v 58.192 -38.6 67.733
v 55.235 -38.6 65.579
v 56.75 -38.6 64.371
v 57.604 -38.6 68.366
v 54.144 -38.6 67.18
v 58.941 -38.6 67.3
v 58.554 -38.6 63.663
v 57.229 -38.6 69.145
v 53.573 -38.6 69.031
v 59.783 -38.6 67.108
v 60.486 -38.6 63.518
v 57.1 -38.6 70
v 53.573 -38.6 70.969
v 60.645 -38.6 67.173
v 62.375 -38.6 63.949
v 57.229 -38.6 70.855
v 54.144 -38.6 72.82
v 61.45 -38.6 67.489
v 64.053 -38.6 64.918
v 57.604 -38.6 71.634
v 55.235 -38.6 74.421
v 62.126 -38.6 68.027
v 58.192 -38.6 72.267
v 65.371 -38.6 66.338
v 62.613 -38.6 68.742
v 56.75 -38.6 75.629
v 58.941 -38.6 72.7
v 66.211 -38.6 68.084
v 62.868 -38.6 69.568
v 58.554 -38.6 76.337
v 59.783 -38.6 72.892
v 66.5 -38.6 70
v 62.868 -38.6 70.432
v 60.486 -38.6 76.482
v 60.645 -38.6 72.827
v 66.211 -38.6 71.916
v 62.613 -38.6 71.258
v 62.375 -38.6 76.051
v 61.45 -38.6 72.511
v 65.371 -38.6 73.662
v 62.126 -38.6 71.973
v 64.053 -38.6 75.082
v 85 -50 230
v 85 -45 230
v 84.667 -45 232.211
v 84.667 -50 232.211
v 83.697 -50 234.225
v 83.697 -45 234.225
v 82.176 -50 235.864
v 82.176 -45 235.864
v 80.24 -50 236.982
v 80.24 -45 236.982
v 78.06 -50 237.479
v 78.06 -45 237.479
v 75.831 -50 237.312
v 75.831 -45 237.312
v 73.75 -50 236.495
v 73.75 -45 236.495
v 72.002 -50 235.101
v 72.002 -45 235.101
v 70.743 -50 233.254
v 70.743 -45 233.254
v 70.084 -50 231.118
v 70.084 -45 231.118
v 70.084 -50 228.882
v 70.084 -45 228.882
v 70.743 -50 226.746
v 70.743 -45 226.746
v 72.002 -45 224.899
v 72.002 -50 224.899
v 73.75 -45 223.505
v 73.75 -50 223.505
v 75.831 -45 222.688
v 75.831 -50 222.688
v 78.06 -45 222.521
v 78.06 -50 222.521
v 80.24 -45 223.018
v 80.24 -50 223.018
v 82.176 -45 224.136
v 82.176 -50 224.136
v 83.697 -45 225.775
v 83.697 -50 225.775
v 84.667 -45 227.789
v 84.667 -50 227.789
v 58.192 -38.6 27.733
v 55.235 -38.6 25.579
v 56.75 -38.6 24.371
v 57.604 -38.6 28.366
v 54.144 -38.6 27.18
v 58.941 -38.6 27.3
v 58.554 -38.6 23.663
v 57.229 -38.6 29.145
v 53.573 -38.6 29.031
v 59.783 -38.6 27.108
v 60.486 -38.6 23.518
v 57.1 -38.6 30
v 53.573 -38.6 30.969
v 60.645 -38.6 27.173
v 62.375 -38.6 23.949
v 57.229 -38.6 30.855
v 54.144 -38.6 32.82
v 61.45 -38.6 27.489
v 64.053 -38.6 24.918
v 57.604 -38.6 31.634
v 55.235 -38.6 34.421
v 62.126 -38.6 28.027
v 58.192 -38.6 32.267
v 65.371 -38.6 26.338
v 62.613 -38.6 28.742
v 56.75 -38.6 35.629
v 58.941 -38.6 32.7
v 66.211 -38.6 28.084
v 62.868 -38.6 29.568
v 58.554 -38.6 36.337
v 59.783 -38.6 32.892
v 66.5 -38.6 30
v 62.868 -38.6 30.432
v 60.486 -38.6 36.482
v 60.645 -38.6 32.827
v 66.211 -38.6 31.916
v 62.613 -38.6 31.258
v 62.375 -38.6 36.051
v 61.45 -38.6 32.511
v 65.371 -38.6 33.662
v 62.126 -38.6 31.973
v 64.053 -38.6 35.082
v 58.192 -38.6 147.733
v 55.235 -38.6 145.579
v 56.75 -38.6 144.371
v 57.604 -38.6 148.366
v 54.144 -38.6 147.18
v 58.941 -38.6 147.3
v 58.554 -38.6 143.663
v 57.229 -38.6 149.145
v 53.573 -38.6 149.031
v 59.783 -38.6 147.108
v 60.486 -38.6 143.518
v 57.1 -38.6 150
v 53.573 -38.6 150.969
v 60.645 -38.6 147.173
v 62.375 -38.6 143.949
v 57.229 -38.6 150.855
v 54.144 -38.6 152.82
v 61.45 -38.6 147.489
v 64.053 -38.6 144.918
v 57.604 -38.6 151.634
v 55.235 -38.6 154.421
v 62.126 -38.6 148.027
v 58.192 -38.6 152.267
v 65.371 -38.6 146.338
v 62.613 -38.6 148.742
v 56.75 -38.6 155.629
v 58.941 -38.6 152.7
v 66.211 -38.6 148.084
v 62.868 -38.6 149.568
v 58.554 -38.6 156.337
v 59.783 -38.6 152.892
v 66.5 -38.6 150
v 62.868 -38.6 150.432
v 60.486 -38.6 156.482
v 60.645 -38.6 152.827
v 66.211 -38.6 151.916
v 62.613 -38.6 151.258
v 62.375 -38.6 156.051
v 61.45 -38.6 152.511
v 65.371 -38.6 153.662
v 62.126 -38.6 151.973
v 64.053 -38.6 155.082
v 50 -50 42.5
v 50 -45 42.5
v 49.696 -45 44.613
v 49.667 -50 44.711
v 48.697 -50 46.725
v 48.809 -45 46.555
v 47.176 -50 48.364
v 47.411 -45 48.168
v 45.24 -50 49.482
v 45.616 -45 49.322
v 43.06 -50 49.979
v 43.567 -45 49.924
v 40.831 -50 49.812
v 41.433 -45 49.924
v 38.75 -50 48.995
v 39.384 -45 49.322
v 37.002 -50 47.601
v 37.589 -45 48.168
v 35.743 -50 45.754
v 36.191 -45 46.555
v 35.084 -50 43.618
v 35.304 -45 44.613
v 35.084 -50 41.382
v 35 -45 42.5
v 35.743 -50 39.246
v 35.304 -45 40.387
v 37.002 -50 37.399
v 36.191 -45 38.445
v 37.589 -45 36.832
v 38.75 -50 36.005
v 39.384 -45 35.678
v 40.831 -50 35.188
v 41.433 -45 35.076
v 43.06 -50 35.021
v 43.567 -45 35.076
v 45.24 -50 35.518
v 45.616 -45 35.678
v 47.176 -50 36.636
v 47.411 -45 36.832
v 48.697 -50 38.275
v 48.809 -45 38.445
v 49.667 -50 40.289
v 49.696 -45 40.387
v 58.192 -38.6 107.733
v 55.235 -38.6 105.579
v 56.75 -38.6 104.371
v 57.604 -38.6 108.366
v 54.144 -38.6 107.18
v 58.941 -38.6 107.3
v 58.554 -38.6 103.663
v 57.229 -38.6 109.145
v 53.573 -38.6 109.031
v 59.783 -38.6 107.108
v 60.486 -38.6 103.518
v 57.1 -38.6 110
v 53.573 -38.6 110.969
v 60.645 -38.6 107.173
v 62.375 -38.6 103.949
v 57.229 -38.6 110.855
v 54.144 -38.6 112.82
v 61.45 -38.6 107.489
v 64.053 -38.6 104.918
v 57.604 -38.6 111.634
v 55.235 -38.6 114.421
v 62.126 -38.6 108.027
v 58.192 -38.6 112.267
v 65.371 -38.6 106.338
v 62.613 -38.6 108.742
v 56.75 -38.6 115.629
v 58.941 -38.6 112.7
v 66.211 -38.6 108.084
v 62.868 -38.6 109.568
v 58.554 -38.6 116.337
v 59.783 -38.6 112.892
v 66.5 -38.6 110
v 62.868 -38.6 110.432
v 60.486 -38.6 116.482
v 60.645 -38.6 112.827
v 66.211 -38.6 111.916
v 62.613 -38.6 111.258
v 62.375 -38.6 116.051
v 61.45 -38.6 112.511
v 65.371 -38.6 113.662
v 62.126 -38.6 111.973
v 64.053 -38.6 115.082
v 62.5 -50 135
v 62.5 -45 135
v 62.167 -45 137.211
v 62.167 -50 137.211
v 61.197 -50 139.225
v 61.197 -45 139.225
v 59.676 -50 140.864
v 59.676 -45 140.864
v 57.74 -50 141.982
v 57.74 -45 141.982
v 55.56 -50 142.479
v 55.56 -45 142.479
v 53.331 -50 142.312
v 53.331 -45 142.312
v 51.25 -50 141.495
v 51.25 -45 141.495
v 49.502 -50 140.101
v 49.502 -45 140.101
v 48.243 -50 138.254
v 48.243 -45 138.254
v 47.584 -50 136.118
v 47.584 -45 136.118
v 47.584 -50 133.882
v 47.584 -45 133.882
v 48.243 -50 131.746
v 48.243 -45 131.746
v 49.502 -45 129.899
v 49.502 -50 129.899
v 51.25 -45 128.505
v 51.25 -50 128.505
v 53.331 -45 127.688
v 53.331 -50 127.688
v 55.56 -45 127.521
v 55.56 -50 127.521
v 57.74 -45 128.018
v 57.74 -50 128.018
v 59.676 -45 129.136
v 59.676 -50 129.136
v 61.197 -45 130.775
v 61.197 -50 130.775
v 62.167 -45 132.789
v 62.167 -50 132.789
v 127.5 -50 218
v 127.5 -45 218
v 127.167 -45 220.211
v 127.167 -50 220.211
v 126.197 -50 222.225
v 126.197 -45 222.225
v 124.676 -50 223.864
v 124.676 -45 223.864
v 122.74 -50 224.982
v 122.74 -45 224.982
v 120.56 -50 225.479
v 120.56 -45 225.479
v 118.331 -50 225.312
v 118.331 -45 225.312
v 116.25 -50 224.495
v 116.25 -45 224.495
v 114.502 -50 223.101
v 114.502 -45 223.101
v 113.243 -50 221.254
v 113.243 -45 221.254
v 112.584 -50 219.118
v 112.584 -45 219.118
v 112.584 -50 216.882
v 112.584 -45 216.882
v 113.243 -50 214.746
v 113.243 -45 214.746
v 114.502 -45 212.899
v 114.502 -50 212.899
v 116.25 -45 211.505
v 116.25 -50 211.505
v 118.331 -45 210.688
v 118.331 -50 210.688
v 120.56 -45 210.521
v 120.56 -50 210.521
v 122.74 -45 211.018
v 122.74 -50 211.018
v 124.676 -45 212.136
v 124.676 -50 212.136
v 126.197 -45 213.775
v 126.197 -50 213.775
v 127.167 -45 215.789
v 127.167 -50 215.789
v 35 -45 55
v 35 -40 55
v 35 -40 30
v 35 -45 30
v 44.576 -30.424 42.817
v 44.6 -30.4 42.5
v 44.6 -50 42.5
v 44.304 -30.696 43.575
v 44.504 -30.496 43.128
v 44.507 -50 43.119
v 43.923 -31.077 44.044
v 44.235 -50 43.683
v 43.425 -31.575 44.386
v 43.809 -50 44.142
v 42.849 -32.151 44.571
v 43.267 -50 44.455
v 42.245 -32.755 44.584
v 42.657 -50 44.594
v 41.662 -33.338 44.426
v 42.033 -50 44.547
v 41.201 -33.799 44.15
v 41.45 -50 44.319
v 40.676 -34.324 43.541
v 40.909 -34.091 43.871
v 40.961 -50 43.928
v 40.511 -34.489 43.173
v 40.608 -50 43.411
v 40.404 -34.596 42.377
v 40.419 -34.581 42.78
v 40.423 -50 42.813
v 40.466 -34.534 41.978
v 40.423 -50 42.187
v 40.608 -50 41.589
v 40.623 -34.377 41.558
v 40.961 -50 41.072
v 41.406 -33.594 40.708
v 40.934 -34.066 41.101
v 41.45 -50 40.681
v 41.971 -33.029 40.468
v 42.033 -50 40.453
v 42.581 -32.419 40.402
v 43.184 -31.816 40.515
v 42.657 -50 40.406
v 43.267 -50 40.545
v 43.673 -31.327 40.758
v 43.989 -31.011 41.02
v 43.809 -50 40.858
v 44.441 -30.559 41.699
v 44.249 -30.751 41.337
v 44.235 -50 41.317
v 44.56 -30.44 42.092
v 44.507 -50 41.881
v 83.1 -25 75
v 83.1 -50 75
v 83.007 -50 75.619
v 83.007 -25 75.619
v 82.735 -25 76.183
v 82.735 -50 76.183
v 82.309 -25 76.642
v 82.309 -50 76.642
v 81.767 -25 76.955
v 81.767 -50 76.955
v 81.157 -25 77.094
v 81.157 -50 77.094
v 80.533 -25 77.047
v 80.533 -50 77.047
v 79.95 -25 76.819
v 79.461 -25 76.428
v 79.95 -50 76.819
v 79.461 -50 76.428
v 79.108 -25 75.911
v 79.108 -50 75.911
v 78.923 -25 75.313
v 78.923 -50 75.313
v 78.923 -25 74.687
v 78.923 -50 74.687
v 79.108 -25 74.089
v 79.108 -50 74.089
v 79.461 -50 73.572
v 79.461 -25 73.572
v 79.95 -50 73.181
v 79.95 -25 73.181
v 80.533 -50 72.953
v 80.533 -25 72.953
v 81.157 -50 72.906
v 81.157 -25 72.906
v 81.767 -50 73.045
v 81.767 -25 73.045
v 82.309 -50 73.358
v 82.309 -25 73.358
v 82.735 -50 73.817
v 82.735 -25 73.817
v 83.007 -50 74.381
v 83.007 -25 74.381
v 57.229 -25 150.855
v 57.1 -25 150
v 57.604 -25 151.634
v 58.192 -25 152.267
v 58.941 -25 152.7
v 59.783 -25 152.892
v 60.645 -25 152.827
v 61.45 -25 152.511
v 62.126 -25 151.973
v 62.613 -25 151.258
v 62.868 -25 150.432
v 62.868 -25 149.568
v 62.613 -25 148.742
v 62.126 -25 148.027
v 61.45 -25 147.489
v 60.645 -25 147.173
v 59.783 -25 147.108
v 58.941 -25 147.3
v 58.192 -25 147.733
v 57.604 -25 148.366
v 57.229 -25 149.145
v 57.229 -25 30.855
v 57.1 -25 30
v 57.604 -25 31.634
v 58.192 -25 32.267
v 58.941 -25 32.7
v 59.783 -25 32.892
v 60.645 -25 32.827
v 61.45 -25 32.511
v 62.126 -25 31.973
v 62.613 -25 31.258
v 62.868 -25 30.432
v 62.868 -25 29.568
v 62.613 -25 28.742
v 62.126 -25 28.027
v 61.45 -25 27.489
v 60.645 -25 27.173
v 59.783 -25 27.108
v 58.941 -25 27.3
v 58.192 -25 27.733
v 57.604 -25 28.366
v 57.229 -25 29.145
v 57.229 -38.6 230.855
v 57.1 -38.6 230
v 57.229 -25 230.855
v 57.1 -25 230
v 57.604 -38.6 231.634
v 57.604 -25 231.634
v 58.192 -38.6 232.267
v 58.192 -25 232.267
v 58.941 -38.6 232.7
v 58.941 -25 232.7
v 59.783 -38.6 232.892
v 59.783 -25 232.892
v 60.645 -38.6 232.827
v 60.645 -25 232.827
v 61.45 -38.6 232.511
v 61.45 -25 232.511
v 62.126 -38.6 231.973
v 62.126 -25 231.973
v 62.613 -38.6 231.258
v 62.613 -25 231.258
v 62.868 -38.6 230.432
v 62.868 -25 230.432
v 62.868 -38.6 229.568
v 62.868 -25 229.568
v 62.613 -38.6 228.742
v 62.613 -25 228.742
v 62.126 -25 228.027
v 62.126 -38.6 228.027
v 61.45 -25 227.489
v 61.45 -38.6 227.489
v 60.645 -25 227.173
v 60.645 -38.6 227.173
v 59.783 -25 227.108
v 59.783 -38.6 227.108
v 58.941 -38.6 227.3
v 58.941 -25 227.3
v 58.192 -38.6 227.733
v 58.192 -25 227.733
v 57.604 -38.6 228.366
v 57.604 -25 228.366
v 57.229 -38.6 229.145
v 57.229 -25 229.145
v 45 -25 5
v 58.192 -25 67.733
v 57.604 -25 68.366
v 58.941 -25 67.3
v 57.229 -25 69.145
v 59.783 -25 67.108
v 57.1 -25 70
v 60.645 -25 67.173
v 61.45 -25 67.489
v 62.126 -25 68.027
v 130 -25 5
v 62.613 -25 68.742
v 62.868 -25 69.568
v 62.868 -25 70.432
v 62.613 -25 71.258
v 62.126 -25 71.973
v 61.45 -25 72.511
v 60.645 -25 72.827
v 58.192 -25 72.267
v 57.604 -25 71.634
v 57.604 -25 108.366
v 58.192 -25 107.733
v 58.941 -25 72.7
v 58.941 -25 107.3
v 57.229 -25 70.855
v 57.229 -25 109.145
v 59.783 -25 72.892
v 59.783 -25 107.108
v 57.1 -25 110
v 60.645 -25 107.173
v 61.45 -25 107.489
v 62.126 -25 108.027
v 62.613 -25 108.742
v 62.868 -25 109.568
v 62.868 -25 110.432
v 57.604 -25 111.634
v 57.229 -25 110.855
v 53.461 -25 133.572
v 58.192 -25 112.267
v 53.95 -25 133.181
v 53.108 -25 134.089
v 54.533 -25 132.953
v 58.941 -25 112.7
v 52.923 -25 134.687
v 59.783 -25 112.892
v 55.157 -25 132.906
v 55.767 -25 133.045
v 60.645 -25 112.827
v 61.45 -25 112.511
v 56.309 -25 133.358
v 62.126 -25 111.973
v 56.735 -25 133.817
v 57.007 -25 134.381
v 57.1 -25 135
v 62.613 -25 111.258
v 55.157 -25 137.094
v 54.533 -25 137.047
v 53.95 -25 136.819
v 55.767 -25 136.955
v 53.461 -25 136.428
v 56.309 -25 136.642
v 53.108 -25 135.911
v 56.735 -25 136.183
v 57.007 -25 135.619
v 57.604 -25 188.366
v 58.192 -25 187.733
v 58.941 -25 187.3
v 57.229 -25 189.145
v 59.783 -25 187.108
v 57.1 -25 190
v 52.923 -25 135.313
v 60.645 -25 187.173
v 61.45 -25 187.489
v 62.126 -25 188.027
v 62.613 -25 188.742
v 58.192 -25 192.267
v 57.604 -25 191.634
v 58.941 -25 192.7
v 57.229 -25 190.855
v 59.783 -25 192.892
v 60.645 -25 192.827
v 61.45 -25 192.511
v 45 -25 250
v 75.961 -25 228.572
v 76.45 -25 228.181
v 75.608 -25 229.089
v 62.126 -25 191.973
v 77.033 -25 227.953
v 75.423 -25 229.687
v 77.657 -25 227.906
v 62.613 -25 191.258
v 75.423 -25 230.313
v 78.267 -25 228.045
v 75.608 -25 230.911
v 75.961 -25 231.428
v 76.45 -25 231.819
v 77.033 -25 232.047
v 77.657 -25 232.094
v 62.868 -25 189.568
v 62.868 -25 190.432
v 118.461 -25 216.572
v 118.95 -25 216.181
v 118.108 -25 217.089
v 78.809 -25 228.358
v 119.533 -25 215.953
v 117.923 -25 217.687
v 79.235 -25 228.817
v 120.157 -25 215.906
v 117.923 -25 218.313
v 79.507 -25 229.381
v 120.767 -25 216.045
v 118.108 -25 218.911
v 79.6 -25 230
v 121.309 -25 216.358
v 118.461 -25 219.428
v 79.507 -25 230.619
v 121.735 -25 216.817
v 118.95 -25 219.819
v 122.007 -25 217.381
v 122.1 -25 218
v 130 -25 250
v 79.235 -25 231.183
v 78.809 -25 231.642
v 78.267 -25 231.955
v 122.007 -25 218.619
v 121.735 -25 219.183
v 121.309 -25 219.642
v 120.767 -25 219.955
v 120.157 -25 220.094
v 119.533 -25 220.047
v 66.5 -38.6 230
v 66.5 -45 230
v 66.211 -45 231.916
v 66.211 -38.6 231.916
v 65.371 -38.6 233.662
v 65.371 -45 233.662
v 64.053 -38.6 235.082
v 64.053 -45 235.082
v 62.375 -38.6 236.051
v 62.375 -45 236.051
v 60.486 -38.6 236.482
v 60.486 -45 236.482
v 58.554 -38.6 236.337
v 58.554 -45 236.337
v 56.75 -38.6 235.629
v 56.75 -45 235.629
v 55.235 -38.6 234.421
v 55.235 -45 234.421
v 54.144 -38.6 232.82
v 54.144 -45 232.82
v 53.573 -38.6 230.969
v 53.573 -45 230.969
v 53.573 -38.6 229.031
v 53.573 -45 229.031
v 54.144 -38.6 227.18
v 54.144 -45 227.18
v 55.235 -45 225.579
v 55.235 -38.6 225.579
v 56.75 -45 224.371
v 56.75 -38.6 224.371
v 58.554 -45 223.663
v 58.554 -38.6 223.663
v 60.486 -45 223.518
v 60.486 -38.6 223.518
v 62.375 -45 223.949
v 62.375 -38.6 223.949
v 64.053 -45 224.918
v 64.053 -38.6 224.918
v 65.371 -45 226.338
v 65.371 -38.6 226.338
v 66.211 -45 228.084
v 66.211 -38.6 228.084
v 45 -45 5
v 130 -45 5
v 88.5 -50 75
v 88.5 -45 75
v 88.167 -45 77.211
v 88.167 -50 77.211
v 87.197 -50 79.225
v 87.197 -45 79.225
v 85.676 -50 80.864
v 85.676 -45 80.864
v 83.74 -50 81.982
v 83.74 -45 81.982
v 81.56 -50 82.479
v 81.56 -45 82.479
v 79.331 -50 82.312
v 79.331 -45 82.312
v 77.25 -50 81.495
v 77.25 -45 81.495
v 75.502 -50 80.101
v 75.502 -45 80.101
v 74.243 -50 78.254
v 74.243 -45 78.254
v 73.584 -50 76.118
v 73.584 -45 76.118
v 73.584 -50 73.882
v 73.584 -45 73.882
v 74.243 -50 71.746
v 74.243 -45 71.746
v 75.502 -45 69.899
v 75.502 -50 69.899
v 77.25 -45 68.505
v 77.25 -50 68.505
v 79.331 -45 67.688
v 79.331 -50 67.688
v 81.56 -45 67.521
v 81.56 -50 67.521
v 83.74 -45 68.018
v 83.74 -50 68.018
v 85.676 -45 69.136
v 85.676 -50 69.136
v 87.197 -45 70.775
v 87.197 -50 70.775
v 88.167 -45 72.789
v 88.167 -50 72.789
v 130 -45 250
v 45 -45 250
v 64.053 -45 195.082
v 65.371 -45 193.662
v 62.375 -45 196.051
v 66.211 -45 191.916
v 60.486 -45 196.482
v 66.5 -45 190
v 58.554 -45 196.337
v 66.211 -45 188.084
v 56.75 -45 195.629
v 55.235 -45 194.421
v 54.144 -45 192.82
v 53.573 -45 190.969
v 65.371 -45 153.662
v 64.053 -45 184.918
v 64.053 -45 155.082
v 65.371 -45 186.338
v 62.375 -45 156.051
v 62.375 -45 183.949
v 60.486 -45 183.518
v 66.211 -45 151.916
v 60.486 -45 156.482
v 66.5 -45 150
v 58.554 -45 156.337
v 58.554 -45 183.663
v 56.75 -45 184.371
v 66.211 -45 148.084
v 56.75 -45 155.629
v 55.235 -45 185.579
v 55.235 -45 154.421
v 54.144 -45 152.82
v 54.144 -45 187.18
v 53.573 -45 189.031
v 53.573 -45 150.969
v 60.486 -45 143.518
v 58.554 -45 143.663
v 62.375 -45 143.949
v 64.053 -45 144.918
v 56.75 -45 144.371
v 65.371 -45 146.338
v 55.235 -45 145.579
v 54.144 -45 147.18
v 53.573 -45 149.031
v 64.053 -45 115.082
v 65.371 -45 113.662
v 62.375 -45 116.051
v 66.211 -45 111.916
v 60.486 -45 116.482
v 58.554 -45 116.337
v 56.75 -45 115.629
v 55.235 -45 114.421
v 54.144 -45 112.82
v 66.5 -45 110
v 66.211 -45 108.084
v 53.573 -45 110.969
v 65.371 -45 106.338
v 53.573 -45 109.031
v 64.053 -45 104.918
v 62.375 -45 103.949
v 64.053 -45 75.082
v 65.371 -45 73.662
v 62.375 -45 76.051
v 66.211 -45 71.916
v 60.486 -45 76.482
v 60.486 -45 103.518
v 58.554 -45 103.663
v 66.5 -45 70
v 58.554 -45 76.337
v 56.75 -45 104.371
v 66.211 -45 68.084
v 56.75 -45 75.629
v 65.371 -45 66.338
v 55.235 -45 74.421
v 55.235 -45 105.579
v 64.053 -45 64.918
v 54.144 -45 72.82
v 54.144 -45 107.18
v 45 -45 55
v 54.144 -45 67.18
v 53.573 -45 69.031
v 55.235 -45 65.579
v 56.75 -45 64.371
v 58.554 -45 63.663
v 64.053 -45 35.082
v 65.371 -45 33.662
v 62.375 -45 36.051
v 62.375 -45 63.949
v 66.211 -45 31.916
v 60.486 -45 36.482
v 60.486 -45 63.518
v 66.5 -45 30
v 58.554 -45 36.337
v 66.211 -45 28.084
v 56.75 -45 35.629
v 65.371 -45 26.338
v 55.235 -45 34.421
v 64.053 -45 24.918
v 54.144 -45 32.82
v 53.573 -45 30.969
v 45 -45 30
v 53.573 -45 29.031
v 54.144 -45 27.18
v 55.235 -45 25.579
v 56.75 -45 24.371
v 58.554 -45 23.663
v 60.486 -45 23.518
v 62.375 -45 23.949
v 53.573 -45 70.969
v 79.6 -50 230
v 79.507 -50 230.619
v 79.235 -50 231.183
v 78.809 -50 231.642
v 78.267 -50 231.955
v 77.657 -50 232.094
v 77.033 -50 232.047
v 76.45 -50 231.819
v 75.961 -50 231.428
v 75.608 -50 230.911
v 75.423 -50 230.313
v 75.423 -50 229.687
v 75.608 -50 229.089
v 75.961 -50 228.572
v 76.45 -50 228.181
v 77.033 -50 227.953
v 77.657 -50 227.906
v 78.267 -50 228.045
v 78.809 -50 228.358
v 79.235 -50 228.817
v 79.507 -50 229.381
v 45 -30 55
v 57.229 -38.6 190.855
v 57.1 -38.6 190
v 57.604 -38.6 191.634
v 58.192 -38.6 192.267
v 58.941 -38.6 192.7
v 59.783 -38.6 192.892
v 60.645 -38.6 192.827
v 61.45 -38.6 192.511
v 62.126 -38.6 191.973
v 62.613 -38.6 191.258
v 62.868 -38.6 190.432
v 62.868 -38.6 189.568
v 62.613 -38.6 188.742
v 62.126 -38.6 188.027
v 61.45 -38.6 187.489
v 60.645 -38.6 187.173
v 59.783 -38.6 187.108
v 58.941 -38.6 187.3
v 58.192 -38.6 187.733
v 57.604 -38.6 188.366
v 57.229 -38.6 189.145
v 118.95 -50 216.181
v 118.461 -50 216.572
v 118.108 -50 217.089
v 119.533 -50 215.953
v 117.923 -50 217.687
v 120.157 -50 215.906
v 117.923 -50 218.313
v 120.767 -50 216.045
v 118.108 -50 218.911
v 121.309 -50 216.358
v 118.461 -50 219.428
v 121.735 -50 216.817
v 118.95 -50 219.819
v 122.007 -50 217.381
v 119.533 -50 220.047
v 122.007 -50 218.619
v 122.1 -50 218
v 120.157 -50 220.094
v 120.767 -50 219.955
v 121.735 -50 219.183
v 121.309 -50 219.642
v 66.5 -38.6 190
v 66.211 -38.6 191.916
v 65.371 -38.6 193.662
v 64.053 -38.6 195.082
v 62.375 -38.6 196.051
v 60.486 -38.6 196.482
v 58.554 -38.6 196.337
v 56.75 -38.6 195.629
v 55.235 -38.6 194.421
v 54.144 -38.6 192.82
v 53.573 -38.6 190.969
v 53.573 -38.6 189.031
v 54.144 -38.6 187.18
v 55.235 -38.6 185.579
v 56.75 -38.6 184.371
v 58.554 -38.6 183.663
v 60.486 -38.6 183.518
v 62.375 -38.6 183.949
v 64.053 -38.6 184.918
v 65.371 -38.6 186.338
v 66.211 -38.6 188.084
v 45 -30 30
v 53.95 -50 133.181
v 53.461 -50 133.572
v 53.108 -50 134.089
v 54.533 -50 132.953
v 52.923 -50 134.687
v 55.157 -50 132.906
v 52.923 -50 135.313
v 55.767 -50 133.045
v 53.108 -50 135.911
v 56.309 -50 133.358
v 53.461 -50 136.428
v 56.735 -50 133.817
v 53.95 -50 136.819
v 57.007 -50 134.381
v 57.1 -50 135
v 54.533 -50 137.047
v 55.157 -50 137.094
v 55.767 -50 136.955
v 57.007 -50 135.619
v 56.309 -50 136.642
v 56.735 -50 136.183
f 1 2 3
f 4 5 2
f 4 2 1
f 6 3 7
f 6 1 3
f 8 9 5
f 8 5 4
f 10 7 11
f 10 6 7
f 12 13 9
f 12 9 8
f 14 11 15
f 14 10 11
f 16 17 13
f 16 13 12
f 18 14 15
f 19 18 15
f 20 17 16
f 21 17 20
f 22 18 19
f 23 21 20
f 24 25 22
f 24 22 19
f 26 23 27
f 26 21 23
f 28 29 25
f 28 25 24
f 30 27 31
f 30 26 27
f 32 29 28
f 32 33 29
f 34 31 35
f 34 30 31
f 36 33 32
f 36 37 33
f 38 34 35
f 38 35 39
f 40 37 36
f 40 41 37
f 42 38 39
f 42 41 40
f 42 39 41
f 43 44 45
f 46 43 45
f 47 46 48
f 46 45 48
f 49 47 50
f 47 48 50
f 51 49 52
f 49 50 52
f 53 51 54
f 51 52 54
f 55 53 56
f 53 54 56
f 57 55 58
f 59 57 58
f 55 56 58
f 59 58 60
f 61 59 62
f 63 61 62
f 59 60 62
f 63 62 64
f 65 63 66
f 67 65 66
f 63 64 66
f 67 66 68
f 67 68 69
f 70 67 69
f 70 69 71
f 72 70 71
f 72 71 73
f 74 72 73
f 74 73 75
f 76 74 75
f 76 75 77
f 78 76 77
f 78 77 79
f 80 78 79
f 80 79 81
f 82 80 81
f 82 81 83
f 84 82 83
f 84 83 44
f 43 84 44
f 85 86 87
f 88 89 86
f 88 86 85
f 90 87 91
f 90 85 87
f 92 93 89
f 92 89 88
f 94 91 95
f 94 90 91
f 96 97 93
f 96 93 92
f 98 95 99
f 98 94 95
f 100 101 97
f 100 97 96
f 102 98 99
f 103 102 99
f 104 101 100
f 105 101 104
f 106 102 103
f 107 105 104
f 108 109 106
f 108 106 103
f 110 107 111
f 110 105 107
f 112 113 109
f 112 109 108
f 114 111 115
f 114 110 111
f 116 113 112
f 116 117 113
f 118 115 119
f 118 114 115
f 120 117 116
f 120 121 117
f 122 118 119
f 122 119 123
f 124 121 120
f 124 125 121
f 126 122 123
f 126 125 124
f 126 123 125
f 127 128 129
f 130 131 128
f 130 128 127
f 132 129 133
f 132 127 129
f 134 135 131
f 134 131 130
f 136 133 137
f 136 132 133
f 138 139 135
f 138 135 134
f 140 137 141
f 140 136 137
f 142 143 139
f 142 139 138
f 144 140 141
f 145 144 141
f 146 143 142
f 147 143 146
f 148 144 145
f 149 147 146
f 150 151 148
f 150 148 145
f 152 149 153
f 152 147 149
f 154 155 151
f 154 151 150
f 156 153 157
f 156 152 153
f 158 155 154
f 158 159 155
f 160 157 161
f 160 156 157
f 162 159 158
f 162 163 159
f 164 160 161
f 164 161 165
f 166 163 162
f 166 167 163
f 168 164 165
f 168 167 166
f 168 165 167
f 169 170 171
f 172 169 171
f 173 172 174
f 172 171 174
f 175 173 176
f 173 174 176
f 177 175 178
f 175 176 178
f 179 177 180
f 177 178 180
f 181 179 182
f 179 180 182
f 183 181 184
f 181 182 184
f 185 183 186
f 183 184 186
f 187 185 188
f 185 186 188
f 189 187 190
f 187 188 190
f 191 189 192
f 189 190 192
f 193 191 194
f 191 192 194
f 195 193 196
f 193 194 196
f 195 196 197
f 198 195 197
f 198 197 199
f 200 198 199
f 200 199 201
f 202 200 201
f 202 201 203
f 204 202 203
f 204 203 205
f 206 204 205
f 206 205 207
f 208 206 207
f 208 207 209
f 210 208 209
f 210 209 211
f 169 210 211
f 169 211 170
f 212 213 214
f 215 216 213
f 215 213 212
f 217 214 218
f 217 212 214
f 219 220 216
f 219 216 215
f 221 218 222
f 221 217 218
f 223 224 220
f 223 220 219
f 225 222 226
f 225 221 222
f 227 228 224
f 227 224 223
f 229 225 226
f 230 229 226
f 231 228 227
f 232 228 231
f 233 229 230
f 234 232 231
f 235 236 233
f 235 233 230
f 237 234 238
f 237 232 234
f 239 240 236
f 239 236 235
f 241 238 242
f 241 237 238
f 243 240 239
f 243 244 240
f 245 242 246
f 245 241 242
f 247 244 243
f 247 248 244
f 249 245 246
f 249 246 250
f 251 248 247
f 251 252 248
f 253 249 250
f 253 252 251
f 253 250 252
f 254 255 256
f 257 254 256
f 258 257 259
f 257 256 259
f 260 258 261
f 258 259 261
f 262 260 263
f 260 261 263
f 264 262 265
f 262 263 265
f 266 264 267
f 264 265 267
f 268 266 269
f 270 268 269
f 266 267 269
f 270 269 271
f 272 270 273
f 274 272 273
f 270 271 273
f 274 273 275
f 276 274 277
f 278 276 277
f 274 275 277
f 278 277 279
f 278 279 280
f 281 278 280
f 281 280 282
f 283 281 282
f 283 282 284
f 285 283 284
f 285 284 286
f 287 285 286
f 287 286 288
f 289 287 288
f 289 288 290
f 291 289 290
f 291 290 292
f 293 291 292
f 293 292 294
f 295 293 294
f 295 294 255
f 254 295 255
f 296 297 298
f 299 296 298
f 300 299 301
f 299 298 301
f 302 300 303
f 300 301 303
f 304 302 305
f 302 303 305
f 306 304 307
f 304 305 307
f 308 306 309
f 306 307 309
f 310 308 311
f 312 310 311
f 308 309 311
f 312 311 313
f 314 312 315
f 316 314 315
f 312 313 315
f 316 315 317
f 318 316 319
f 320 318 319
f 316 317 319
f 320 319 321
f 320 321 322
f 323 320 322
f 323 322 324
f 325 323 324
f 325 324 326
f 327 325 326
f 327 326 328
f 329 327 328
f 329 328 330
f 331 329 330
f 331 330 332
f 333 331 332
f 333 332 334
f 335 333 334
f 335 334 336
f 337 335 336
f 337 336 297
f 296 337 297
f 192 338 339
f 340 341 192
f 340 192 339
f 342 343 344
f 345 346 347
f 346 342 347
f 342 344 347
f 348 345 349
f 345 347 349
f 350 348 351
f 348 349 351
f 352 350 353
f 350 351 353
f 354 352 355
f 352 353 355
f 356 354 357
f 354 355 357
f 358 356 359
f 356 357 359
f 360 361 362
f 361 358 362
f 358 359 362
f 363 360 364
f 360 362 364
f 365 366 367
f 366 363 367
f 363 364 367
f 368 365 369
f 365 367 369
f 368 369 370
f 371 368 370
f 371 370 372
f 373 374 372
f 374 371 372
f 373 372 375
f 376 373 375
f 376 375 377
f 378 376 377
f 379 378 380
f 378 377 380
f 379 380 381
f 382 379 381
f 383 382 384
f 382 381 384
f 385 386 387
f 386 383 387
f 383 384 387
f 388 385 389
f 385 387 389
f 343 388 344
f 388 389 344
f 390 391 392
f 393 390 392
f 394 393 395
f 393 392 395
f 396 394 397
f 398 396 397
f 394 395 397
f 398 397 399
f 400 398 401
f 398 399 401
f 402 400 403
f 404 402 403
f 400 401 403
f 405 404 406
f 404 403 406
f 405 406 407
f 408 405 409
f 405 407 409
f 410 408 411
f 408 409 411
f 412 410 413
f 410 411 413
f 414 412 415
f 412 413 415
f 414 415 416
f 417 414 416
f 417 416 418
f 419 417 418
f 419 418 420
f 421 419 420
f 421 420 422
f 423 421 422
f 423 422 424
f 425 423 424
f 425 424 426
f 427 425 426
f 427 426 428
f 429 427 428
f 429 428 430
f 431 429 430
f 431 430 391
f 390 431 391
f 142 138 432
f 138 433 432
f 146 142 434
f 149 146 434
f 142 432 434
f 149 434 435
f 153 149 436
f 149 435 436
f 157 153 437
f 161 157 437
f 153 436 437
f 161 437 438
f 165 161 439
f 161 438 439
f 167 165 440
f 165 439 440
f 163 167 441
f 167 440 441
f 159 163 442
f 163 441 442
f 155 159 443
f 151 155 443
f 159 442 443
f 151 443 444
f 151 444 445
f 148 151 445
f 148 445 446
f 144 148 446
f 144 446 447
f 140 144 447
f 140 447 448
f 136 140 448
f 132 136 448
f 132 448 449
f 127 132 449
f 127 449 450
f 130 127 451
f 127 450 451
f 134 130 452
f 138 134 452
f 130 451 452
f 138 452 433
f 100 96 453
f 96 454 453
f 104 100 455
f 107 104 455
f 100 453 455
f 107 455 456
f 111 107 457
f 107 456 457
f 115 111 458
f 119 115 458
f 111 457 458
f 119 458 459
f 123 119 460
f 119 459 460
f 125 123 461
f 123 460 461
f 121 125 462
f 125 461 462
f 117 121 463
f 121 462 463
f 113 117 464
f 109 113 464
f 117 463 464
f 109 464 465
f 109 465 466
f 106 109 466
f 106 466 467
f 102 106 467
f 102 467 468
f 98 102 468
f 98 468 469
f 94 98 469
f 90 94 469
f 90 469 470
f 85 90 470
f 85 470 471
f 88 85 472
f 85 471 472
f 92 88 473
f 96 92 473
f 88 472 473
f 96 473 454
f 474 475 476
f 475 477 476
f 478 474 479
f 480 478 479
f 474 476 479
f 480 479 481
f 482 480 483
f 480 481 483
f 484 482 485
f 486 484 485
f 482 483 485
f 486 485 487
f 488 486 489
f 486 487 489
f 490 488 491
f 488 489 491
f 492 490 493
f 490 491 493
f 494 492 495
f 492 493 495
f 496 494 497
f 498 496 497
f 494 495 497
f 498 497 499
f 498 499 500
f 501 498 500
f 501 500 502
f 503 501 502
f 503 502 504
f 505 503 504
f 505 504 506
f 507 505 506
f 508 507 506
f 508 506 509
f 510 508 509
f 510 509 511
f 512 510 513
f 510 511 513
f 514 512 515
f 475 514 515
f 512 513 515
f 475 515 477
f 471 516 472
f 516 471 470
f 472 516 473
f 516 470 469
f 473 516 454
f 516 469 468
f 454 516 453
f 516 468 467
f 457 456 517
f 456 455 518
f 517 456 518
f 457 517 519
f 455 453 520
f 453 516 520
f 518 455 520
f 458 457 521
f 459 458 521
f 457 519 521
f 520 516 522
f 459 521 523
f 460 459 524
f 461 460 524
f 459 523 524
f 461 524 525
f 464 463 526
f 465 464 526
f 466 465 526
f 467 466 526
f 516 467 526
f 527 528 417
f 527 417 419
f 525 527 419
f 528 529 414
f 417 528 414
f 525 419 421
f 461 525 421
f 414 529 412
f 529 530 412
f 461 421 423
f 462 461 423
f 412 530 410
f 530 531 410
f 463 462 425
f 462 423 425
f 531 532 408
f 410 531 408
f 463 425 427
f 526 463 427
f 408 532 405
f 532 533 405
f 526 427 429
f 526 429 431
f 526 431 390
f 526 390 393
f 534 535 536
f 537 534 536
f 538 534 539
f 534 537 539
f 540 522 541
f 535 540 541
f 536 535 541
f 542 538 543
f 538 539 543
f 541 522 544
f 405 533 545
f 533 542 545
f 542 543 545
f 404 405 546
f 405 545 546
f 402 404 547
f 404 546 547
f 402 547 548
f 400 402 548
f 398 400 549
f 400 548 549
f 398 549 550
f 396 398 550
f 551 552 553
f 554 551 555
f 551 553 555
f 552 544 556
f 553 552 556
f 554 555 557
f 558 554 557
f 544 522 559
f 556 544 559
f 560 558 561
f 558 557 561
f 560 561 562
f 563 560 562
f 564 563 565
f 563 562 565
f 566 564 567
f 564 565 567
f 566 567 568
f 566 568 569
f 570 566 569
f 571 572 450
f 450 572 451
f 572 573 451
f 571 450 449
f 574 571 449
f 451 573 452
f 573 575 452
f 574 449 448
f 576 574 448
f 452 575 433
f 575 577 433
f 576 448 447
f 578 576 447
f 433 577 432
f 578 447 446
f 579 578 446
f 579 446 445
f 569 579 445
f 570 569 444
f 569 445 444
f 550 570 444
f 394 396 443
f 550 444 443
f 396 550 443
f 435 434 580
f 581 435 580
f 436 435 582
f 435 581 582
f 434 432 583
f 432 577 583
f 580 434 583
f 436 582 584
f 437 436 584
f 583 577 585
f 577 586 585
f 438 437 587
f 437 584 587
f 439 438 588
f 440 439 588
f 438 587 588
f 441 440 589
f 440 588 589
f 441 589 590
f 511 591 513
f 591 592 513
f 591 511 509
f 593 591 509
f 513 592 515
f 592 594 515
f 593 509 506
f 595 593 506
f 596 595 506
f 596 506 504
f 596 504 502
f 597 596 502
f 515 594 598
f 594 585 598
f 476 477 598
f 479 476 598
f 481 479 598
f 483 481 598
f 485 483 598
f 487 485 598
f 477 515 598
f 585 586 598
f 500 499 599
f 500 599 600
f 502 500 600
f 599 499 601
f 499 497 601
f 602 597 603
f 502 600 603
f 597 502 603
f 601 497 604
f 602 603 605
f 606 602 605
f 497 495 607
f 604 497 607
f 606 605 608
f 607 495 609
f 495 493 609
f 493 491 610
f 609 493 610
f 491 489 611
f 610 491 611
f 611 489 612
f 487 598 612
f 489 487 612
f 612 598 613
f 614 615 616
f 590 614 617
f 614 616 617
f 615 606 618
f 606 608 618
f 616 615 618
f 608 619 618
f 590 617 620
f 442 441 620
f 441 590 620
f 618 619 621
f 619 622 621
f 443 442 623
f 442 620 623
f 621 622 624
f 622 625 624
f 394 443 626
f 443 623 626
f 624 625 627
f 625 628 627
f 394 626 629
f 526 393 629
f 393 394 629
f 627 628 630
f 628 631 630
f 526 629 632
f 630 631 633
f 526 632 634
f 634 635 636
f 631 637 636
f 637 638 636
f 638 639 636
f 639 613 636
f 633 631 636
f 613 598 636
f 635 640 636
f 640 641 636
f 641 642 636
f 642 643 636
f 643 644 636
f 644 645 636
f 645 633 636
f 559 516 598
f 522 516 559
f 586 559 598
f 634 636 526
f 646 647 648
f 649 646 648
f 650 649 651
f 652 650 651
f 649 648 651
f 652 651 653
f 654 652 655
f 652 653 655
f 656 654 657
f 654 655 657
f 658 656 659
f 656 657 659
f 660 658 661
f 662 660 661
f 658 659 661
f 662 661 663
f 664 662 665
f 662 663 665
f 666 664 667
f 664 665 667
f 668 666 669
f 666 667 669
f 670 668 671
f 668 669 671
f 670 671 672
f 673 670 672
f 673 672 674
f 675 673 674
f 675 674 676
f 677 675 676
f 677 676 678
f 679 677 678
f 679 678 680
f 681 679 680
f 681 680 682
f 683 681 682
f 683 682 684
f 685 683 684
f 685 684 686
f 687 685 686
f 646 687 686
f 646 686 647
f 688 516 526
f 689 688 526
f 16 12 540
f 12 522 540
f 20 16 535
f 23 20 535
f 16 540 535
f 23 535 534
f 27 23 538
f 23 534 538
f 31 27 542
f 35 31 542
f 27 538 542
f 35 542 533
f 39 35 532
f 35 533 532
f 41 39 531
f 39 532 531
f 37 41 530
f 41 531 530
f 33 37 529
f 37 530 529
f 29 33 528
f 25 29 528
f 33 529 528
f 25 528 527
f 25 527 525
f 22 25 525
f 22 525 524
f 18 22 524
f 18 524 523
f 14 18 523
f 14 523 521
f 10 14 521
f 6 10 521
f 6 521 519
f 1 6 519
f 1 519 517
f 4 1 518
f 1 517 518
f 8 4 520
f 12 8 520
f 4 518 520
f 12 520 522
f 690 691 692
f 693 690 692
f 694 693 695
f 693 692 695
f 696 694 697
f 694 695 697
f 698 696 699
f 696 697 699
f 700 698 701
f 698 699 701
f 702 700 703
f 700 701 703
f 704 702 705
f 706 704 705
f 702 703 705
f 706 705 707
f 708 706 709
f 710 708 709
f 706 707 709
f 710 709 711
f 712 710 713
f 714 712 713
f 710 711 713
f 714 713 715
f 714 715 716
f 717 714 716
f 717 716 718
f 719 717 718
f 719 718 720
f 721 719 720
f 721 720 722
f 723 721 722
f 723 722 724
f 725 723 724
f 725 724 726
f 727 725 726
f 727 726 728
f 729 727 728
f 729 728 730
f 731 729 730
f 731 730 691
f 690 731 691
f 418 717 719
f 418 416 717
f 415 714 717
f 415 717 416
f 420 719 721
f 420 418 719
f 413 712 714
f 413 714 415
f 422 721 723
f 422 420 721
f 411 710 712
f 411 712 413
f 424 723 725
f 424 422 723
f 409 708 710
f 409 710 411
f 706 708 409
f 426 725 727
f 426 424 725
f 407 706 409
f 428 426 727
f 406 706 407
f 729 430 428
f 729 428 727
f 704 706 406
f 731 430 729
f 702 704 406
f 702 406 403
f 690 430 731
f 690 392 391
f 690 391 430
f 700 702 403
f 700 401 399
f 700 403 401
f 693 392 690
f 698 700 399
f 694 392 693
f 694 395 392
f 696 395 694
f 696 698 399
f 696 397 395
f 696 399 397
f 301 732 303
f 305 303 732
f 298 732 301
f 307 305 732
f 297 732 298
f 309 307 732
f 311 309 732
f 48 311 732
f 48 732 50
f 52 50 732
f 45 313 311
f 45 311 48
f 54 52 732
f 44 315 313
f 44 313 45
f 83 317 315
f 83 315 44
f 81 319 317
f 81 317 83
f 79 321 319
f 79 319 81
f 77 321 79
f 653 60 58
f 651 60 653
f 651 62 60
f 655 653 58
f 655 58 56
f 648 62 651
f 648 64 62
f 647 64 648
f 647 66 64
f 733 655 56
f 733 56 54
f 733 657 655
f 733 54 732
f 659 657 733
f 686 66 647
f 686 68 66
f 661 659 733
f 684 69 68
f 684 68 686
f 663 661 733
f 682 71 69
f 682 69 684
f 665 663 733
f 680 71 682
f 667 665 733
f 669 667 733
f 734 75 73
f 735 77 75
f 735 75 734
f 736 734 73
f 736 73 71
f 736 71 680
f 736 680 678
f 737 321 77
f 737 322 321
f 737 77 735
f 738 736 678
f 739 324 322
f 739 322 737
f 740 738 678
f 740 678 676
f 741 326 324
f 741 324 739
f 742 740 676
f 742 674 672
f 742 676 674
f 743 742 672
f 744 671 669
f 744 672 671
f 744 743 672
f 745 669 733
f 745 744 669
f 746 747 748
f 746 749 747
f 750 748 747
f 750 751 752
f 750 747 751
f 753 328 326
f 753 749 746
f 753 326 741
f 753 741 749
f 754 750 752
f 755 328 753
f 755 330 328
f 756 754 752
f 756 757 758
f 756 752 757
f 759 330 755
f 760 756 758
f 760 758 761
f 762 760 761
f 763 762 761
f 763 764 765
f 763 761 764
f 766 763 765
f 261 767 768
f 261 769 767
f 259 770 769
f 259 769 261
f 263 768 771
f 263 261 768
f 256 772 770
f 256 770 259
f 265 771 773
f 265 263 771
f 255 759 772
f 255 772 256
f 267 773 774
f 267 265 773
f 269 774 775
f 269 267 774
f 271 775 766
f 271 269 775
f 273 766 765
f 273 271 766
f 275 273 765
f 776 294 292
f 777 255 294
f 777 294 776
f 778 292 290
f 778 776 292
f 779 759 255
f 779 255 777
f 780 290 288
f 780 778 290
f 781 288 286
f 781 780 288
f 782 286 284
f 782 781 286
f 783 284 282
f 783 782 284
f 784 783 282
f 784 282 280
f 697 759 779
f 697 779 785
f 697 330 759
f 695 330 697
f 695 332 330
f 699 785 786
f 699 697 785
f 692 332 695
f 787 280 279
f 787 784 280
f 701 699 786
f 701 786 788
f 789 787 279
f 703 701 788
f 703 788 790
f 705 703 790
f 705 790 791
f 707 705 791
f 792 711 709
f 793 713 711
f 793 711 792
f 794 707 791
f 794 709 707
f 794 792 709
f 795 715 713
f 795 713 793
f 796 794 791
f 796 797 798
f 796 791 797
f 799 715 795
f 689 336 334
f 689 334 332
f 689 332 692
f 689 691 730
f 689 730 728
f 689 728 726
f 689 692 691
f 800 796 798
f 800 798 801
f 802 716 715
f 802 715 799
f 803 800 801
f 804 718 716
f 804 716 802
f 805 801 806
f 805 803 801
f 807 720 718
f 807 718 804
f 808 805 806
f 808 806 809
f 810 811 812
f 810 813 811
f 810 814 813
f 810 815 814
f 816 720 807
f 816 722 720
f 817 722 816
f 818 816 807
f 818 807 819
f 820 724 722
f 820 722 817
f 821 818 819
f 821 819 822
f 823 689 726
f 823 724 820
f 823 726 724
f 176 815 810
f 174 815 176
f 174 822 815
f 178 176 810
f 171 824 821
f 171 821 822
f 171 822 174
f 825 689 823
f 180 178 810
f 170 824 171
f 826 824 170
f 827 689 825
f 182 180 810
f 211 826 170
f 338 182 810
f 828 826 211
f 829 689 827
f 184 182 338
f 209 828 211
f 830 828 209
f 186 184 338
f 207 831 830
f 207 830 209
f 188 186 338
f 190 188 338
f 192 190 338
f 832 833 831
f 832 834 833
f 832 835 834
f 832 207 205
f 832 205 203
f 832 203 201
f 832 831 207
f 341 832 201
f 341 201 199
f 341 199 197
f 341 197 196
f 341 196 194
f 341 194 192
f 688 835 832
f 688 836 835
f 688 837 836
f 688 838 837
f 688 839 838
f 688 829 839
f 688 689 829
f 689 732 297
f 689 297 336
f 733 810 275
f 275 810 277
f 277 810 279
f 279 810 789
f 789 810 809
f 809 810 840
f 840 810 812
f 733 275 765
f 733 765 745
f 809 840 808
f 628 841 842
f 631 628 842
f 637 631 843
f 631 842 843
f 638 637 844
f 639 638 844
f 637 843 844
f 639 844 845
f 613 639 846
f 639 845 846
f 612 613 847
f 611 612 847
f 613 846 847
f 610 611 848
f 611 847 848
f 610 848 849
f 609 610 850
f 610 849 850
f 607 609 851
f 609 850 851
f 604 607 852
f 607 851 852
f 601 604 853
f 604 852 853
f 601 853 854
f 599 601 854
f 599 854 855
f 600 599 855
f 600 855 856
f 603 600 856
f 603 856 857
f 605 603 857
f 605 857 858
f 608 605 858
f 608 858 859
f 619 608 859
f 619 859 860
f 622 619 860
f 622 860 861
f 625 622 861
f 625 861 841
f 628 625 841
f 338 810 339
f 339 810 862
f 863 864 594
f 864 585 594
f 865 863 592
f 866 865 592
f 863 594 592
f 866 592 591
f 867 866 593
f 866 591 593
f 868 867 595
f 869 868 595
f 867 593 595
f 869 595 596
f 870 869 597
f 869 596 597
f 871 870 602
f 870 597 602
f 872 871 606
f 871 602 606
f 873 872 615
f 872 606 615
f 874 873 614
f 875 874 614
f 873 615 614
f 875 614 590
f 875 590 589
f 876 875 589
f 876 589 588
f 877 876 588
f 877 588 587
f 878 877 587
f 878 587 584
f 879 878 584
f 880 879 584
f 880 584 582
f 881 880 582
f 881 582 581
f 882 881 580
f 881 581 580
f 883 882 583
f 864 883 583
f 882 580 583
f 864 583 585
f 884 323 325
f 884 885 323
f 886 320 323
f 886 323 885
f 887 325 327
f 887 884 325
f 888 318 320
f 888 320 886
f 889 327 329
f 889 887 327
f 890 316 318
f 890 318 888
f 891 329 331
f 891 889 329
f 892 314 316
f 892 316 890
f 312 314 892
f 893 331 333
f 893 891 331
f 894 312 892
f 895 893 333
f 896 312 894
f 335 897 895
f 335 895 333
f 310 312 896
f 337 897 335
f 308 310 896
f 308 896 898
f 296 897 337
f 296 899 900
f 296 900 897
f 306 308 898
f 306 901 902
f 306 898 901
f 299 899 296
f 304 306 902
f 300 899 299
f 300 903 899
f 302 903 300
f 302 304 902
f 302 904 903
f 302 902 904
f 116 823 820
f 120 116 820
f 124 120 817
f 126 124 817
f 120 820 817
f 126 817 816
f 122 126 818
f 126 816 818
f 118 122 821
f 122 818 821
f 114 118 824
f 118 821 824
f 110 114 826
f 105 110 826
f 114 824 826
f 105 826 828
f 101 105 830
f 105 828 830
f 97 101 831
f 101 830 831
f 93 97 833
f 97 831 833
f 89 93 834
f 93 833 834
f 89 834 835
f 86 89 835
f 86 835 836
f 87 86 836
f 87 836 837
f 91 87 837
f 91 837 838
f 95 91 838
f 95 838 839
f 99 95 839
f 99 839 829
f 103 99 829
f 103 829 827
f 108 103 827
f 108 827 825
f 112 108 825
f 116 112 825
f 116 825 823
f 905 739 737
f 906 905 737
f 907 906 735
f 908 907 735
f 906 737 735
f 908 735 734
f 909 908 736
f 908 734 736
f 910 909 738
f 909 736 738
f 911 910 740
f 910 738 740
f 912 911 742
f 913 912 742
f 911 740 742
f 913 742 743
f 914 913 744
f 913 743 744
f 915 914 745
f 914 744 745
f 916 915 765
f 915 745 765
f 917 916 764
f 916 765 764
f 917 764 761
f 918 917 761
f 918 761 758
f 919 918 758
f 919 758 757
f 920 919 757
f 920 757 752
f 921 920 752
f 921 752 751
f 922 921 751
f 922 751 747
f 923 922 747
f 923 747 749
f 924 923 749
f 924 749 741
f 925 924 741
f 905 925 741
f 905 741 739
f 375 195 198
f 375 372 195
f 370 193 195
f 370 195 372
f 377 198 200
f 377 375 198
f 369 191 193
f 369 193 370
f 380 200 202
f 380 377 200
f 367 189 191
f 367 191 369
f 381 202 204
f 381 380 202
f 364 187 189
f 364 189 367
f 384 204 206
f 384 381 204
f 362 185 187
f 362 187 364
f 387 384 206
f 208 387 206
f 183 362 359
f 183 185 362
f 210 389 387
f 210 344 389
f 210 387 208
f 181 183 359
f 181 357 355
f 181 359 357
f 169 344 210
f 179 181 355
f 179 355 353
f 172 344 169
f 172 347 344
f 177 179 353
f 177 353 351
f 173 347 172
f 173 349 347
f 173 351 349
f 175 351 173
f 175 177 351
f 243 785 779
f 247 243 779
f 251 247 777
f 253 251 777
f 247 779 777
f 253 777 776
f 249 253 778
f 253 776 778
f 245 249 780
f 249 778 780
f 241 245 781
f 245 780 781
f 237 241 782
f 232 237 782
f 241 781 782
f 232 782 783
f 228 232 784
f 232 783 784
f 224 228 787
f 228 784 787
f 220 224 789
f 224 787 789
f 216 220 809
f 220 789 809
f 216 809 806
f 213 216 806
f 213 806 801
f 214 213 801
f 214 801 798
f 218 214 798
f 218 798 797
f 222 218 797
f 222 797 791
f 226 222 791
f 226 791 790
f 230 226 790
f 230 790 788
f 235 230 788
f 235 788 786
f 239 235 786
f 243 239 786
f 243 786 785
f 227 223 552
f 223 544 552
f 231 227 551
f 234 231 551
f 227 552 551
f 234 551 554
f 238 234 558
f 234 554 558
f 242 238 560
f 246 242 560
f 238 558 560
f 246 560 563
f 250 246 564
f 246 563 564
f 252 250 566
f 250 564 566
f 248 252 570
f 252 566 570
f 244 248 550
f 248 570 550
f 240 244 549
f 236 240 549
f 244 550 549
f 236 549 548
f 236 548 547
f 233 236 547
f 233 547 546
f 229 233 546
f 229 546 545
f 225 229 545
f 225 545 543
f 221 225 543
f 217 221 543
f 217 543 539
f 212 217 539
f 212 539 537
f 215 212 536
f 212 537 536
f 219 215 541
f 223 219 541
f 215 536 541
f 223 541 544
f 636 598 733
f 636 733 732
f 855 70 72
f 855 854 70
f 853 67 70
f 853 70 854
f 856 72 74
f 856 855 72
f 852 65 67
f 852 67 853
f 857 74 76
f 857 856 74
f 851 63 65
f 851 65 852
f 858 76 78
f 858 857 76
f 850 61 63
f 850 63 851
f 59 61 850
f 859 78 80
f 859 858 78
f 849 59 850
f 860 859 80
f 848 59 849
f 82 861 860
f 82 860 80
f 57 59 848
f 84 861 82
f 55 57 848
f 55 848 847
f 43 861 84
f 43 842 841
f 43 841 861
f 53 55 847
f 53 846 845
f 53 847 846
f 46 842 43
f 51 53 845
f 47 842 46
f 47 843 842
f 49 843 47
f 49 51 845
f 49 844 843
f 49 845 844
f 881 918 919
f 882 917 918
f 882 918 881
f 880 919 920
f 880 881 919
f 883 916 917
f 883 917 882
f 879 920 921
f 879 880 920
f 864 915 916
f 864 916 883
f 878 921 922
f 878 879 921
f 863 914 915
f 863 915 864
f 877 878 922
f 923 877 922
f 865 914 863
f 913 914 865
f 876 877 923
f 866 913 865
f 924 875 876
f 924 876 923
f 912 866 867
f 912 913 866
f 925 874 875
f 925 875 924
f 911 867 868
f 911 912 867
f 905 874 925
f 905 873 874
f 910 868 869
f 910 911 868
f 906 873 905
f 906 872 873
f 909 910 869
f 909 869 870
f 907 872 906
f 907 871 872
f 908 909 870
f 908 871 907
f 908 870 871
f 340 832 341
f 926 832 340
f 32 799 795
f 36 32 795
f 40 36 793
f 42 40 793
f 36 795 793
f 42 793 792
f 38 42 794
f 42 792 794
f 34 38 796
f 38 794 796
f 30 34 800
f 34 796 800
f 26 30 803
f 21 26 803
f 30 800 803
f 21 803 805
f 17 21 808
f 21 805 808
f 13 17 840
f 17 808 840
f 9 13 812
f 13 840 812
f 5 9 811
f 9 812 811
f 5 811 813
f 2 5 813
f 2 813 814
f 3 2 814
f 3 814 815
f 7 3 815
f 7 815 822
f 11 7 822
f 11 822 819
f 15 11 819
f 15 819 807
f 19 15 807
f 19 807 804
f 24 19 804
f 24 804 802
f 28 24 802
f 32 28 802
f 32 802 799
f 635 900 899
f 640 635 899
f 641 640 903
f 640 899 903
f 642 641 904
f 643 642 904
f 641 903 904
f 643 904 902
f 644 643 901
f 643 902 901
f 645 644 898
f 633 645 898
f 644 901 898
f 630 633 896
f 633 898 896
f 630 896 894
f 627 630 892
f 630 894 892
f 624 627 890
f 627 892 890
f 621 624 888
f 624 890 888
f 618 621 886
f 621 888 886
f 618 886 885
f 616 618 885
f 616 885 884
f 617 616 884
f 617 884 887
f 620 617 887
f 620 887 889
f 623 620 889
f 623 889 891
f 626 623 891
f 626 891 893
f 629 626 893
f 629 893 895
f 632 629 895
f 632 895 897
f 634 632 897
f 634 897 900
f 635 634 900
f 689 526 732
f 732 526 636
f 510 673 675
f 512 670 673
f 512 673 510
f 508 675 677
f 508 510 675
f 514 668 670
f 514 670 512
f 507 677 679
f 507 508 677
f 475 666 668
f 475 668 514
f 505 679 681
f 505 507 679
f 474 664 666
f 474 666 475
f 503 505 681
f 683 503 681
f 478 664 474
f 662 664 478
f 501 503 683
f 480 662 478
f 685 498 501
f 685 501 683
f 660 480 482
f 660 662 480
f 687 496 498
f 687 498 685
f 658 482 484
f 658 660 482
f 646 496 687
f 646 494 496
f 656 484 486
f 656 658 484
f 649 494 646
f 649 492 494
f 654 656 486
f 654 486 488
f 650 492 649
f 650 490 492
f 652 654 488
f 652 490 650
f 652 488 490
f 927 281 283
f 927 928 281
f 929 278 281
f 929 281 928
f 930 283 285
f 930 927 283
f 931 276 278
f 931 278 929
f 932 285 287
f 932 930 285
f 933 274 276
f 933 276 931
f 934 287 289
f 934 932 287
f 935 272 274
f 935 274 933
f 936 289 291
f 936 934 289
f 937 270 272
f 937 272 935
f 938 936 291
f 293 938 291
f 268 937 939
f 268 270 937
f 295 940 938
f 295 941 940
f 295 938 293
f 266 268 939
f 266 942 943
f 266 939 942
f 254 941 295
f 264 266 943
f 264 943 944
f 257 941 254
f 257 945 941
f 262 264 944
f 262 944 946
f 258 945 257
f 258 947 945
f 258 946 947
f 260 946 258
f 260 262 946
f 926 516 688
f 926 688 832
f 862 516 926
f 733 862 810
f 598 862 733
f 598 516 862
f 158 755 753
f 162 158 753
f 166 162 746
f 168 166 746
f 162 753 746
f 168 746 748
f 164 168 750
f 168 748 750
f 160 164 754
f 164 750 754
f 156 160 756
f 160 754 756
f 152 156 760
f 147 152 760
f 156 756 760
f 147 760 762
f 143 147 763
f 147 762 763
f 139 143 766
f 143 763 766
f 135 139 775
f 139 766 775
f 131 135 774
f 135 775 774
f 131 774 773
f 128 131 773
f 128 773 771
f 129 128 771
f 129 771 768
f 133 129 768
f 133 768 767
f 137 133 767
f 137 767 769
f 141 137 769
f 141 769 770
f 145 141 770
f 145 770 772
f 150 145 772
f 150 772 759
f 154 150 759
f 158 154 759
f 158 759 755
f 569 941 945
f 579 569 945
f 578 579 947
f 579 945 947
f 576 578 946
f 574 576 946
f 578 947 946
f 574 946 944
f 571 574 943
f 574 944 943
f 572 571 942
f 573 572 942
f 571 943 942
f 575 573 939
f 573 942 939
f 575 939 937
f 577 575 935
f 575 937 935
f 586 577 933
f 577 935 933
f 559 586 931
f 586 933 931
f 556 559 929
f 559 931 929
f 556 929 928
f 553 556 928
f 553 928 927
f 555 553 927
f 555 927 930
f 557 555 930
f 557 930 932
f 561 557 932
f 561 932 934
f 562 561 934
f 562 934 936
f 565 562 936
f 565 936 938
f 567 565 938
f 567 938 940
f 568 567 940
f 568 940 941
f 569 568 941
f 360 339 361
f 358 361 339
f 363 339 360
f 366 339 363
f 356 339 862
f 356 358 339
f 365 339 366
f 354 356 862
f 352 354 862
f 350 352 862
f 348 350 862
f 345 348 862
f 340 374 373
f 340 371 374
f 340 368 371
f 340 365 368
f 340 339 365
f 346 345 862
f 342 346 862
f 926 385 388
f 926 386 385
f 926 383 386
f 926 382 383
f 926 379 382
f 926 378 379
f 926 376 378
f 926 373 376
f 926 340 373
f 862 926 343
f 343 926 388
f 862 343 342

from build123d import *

# Parameters (mm, degrees)
SKETCH014_W         = 85
SKETCH014_H         = 245
PAD009_DEPTH        = 20
SKETCH015_R         = 7.5
PAD010_DEPTH        = 10
PAD011_DEPTH        = 25
SKETCH017_R         = 2.1
HOLE005_DEPTH       = 25.001
HOLE006_D           = 5.8
HOLE006_DEPTH       = 25
HOLE006_CBORE_D     = 13
HOLE006_CBORE_DEPTH = 6.4


with BuildPart() as part:
    # Sketch014 → Pad009 (new body)
    with BuildSketch(Plane.XZ.offset(25)):
        with Locations((87.5, 127.5)):
            Rectangle(SKETCH014_W, SKETCH014_H)
    extrude(amount=PAD009_DEPTH)

    # Sketch015 → Pad010 (join)
    with BuildSketch(Plane.XZ.offset(40)):
        with Locations((77.5, 230)):
            Circle(SKETCH015_R)
        with Locations((120, 218)):
            Circle(SKETCH015_R)
        with Locations((55, 135)):
            Circle(SKETCH015_R)
        with Locations((42.5, 42.5)):
            Circle(SKETCH015_R)
        with Locations((81, 75)):
            Circle(SKETCH015_R)
    extrude(amount=PAD010_DEPTH)

    # Sketch016 → Pad011 (join)
    with BuildSketch(Plane.XY.offset(30)):
        Polygon((35, -40), (45, -30), (45, -45), (35, -45), align=None)
    extrude(amount=PAD011_DEPTH)

    # Sketch017 → Hole005 (cut, through all)
    with BuildSketch(Plane.XZ.offset(50)):
        with Locations((77.5, 230)):
            Circle(SKETCH017_R)
        with Locations((120, 218)):
            Circle(SKETCH017_R)
        with Locations((55, 135)):
            Circle(SKETCH017_R)
        with Locations((42.5, 42.5)):
            Circle(SKETCH017_R)
        with Locations((81, 75)):
            Circle(SKETCH017_R)
    extrude(amount=-HOLE005_DEPTH, mode=Mode.SUBTRACT)

    # Hole006
    with Locations(Plane.XZ.offset(45)):
        with Locations((60, 230), (60, 190), (60, 150), (60, 110), (60, 70), (60, 30)):
            CounterBoreHole(HOLE006_D / 2, HOLE006_CBORE_D / 2, HOLE006_CBORE_DEPTH, depth=HOLE006_DEPTH)


solid = part.part
